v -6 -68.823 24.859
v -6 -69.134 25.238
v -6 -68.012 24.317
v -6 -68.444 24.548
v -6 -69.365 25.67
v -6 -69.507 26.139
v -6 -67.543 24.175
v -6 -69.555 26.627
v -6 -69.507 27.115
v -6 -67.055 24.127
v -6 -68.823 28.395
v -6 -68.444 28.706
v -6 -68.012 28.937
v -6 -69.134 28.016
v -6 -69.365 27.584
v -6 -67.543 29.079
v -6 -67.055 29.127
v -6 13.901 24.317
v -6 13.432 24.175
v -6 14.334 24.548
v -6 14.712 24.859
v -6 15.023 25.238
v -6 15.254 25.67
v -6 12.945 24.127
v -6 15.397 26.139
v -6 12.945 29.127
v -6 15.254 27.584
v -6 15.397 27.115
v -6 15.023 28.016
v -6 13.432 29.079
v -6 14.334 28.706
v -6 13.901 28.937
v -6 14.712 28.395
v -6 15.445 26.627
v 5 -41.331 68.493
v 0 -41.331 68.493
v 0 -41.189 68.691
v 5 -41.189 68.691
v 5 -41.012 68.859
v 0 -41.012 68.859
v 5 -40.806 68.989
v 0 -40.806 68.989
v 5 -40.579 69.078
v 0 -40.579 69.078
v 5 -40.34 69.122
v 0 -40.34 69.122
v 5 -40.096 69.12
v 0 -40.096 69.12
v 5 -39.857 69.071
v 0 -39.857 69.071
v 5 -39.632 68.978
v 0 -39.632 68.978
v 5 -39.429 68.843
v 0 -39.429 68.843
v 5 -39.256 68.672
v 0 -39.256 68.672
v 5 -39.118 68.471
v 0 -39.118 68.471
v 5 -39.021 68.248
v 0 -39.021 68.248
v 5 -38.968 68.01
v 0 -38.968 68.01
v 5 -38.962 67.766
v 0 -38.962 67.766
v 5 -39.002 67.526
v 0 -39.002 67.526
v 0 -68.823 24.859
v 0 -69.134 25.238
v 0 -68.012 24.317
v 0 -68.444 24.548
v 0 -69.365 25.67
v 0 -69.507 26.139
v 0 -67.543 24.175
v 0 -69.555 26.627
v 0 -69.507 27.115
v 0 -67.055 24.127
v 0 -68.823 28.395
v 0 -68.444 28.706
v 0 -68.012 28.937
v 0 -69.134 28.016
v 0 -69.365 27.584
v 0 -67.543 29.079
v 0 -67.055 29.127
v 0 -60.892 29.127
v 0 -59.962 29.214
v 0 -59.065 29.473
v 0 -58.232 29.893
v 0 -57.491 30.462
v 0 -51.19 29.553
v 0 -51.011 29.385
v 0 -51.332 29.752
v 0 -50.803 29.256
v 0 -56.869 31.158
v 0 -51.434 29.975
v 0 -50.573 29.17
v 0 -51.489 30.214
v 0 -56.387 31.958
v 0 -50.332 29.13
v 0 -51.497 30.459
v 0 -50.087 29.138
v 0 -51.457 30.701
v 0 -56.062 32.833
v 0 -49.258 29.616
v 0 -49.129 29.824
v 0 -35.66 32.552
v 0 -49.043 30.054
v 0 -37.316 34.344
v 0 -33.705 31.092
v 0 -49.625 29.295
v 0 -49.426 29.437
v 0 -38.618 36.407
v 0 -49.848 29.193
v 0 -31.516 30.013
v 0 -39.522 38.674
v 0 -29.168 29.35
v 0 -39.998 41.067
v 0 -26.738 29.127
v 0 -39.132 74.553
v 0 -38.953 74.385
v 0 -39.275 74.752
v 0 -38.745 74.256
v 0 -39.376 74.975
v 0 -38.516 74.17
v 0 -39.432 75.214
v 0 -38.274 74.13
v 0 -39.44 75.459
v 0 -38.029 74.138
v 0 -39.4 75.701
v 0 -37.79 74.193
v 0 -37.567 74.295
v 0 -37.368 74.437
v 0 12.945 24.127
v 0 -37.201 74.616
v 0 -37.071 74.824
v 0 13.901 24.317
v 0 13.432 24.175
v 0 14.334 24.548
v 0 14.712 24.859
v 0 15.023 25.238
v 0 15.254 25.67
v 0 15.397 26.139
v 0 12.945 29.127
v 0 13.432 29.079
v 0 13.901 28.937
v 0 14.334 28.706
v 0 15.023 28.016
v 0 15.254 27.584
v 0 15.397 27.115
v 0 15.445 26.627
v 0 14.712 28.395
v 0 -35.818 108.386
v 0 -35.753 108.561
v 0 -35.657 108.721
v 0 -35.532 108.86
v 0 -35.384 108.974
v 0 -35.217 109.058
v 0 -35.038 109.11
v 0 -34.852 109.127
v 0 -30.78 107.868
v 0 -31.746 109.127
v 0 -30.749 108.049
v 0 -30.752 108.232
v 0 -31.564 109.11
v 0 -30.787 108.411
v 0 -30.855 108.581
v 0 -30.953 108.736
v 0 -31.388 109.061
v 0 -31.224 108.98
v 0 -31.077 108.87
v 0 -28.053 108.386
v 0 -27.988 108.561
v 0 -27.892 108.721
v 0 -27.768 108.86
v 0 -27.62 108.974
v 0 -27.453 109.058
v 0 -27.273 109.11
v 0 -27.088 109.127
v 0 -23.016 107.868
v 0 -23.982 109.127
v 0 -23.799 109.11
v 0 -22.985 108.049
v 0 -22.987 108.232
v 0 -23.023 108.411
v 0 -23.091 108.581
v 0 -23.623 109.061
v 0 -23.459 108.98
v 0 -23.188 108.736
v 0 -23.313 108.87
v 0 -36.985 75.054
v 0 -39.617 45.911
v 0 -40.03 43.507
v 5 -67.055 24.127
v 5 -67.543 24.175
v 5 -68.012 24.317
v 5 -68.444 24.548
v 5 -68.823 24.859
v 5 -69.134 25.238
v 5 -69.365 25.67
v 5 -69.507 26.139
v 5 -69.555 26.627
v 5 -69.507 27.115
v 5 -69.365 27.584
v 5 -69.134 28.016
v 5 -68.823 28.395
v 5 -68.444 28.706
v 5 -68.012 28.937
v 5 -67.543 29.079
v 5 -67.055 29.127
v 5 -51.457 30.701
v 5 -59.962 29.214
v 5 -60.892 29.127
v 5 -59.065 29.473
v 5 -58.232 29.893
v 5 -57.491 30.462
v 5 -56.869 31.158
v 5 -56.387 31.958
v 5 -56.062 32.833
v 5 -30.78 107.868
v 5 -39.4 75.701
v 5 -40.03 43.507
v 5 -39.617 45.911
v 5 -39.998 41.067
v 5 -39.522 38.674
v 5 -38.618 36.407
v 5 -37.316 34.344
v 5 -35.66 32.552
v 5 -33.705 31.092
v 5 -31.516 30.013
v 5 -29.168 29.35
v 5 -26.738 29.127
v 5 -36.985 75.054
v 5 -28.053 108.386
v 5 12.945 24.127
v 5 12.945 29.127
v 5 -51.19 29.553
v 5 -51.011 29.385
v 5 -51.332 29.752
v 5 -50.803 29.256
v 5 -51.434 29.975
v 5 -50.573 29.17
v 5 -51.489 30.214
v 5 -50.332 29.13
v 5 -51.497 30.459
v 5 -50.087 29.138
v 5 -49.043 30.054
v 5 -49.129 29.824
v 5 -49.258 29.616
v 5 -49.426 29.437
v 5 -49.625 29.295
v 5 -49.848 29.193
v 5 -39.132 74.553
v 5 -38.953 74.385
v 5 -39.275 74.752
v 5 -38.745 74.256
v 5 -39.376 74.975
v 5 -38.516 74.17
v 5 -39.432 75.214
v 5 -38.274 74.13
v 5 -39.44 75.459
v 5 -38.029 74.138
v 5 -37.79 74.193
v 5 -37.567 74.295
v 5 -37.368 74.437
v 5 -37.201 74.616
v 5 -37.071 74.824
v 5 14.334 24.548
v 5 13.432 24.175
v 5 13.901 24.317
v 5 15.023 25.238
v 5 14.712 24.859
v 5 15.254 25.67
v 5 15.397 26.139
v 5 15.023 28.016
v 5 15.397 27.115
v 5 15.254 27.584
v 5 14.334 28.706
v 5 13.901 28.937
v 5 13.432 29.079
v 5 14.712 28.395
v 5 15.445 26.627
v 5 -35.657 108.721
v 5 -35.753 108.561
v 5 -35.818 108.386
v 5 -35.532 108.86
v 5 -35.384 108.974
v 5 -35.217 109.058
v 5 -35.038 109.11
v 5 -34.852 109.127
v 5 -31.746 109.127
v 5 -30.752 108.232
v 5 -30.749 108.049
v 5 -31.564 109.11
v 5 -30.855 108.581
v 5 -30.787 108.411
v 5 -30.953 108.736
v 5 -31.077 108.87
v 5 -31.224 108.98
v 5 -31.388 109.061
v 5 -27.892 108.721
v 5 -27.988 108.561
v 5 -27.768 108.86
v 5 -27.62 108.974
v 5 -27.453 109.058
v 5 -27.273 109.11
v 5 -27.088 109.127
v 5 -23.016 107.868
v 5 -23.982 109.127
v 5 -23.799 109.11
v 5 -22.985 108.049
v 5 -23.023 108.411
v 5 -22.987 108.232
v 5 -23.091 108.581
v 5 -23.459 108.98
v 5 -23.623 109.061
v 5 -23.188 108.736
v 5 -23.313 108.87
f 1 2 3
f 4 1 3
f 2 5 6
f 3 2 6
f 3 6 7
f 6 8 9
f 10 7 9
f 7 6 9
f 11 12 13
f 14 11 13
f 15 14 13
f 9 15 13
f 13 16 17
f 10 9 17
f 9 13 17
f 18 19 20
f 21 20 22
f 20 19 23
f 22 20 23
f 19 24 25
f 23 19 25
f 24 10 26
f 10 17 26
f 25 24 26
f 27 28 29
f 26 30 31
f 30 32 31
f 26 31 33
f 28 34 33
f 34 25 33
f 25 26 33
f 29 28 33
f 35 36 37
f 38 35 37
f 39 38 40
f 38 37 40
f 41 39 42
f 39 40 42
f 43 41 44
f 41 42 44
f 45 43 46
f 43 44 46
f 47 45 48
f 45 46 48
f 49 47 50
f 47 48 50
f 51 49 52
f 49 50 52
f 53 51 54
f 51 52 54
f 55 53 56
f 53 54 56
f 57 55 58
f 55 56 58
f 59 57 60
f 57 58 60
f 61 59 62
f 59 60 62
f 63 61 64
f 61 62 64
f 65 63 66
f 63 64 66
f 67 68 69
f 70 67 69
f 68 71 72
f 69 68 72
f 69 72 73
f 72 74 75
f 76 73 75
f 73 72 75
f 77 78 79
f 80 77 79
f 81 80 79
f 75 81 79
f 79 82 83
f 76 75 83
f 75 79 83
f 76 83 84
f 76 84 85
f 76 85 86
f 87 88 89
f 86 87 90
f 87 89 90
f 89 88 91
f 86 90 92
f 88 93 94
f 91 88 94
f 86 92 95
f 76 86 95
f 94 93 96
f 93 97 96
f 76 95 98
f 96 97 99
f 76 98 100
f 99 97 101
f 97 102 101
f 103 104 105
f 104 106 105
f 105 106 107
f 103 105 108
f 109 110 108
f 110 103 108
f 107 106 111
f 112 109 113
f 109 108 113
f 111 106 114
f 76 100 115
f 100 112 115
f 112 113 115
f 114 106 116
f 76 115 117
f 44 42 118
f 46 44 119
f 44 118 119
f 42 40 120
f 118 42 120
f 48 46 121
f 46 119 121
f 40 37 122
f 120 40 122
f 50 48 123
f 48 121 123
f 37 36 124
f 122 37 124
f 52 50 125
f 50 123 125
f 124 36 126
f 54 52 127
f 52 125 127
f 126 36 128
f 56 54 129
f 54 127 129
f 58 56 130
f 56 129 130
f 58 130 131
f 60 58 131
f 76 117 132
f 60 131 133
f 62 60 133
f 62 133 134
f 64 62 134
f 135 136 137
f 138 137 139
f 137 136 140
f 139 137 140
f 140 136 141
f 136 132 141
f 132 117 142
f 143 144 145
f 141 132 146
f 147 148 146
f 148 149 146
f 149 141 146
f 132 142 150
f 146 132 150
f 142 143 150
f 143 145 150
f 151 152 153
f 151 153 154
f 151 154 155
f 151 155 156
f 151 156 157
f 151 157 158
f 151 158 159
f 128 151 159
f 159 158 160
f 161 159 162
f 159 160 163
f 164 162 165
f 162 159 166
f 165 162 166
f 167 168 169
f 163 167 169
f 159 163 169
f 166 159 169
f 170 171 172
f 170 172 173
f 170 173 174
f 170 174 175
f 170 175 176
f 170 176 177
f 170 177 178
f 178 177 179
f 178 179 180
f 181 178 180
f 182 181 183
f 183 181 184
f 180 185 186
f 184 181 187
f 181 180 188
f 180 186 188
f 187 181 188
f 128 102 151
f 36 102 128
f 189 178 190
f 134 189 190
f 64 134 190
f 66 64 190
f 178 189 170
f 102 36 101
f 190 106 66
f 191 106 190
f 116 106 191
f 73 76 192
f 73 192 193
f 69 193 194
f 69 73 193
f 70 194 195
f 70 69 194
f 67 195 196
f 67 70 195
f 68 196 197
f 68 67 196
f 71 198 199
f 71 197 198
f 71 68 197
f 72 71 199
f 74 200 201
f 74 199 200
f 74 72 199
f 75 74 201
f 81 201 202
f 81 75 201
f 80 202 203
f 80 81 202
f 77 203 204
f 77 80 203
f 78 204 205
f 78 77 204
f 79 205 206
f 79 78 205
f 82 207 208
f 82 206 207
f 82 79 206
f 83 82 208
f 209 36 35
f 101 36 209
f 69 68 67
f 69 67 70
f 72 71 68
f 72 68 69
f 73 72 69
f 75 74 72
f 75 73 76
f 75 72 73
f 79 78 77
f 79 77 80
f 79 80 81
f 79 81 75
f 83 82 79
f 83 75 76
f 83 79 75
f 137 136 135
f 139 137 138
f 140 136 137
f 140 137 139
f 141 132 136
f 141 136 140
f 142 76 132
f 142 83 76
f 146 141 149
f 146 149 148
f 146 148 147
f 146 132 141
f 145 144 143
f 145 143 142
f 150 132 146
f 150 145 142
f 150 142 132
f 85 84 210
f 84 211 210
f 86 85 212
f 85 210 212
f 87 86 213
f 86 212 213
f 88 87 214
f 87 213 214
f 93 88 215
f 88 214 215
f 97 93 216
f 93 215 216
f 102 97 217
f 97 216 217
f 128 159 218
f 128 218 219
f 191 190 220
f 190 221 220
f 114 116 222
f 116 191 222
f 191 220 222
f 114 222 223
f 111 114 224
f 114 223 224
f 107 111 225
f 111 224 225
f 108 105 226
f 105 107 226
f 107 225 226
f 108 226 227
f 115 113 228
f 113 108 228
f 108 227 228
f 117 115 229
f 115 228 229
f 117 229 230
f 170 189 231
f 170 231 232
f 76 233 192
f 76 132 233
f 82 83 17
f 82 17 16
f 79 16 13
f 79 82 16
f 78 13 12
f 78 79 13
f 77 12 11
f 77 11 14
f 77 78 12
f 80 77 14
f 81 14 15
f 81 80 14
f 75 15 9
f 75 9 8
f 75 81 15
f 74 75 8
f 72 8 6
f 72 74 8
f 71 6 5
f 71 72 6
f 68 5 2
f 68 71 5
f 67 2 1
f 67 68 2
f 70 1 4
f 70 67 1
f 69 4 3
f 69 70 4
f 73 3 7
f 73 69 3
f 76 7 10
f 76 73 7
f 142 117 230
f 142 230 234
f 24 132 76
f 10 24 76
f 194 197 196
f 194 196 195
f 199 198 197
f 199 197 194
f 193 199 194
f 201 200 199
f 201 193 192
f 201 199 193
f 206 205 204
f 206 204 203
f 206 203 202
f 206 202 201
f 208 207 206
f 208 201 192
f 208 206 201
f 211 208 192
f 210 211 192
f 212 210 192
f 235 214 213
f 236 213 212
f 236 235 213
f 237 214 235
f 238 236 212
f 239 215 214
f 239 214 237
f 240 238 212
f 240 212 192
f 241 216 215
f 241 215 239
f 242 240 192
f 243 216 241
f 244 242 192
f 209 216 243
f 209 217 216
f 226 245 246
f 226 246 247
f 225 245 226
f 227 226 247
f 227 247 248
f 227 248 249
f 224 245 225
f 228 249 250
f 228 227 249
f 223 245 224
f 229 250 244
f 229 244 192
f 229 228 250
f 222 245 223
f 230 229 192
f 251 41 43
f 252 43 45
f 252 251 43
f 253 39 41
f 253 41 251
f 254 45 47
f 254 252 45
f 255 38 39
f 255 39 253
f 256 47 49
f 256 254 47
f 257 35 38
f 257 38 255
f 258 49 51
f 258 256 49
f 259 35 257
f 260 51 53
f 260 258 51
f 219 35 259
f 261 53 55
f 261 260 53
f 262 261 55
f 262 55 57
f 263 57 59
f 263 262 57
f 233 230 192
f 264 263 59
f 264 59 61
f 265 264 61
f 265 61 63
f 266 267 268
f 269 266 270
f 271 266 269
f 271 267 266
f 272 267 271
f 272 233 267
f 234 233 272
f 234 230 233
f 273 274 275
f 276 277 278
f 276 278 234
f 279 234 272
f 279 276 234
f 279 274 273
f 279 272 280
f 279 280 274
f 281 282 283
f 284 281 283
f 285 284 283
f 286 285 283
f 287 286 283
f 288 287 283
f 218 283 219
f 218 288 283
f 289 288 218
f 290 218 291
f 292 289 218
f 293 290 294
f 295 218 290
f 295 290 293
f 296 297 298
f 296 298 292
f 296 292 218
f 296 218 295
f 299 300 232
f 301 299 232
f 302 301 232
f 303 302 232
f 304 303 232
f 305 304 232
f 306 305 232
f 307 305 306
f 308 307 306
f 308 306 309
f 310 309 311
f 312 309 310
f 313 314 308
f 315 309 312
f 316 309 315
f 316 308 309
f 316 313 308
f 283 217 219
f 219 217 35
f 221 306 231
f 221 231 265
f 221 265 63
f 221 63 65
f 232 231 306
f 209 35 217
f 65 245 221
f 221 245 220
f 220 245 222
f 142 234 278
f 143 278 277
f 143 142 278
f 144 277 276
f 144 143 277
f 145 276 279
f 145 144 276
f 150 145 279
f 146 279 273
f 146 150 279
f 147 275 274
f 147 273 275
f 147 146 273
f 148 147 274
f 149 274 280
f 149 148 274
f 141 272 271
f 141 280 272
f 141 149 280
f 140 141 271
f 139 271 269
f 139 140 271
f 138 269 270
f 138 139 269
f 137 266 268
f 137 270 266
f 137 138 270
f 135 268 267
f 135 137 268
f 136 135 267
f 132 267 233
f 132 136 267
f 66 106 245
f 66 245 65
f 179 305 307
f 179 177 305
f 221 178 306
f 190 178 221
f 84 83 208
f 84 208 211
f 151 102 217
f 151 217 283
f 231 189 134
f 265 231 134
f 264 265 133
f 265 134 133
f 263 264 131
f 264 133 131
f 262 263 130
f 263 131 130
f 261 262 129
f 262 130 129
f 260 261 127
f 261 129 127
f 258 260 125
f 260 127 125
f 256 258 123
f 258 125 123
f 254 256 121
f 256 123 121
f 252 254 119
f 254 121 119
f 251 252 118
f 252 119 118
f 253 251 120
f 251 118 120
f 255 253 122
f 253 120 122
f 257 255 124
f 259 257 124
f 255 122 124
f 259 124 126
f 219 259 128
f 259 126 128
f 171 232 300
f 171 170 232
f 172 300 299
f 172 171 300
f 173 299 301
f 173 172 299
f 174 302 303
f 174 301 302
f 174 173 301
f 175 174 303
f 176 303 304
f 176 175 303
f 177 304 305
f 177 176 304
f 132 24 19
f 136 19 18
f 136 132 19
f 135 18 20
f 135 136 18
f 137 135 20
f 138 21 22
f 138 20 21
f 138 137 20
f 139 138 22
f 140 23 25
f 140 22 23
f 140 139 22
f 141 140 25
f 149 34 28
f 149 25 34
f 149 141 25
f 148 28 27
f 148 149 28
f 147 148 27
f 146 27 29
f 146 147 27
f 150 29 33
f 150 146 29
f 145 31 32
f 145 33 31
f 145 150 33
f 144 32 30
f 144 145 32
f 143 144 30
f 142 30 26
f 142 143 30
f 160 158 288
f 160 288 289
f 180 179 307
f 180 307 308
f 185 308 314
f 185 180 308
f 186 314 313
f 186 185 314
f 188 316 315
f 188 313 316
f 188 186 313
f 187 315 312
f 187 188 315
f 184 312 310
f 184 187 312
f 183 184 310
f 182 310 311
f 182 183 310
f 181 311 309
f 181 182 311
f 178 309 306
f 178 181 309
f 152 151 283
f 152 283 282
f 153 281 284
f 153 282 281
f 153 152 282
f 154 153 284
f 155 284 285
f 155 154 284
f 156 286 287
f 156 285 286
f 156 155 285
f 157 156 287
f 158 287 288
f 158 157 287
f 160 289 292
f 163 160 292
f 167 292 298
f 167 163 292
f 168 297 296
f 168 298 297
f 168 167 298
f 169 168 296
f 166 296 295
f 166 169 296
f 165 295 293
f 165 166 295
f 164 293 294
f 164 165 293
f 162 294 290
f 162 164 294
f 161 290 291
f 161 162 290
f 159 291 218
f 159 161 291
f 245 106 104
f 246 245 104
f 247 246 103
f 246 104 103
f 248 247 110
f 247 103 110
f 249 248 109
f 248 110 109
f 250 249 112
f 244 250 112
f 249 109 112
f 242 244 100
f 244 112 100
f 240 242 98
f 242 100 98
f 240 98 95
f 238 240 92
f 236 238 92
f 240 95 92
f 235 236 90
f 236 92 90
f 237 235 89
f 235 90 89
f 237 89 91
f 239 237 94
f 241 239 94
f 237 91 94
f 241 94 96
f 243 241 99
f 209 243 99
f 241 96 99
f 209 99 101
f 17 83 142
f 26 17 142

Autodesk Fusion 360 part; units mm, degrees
sketch "Sketch1" plane through (0, 0, 0) normal (1, 0, 0) x (0, 1, 0)
  circle A0 centre (-67.0553, 26.6271) radius 2.5
  line L0 (-67.0553, 29.1271) -> (12.9447, 29.1271)
  line L1 (12.9447, 29.1271) -> (12.9447, 24.1271)
  line L2 (12.9447, 24.1271) -> (-67.0553, 24.1271)
  line L3 (-67.0553, 24.1271) -> (-67.0553, 29.1271)
  circle A1 centre (12.9447, 26.6271) radius 2.5
  line L4 (-57.0553, 29.1271) -> (-57.0553, 44.2726) construction
  line L5 (-57.0553, 29.1271) -> (-35.818, 108.3859)
  line L6 (-34.8521, 109.1271) -> (-31.7462, 109.1271)
  line L7 (-30.7803, 107.8682) -> (-51.8789, 29.1271)
  line L8 (-49.2908, 29.1271) -> (-28.0534, 108.3859)
  line L9 (-23.0157, 107.8682) -> (-44.1144, 29.1271)
  line L10 (-27.0875, 109.1271) -> (-23.9817, 109.1271)
  arc A2 (-34.8521, 109.1271) -> (-35.818, 108.3859) centre (-34.8521, 108.1271) ccw
  arc A3 (-30.7803, 107.8682) -> (-31.7462, 109.1271) centre (-31.7462, 108.1271) ccw
  arc A4 (-27.0875, 109.1271) -> (-28.0534, 108.3859) centre (-27.0875, 108.1271) ccw
  arc A5 (-23.0157, 107.8682) -> (-23.9817, 109.1271) centre (-23.9817, 108.1271) ccw
  line L11 (-37.233, 74.1271) -> (-39.8212, 74.1271)
  line L12 (-41.161, 69.1271) -> (-38.5728, 69.1271)
  circle A6 centre (-40.2305, 67.855) radius 1.272
  circle A7 centre (-38.1922, 75.3771) radius 1.25
  line L13 (-38.1922, 75.3771) -> (-39.4422, 75.3771)
  line L14 (-38.1922, 75.3771) -> (-36.9422, 75.3771)
  line L15 (-40.2305, 67.855) -> (-41.5025, 67.8524)
  line L16 (-40.2305, 67.855) -> (-38.9585, 67.8577)
  circle A8 centre (-50.2499, 30.3771) radius 1.25
  dimension "d6" = 5
  dimension "d7" = 80
  dimension "d8" = 5
  dimension "d9" = 10
  dimension "d10" = 2.5
  dimension "d11" = 5
  dimension "d12" = 5
  dimension "d13" = 75
  dimension "d16" = 1
  dimension "d17" = 1
  dimension "d18" = 1
  dimension "d19" = 1
  dimension "d20" = 80
  dimension "d35" = 5
  dimension "d36" = 35
extrude "Extrude1" add sketch "Sketch1" along normal blind 5 contours A0 L3 | A0 L0 L2 A1 | A0 L3 | L0 L5 L6 L7 A2 A3 A6 | L1 A1 | L1 A1 | L0 L7 A8 | L0 L8 A8 | L0 L8 L9 L10 A4 A5 | L7 A6 | L8 L12 A6 | L7 L12 A6 | L7 L8 L11 L12 | L7 L11 A7 | L8 L11 A7 makes body 1
fillet "FrontFillet" radius 5 1 edges at (2.5, -57.0553, 29.1271) on bodies 1
fillet "RearArmFillet" radius 13.3333 1 edges at (2.5, -44.1144, 29.1271) on bodies 1
extrude "AddBaseThickener" add sketch "Sketch1" against normal blind 6 separate body contours A0 L3 | A0 L0 L2 A1 | A0 L3 | L1 A1 | L1 A1 makes body 2
copy_body "CutPasteBodies2" bodies 1 2 removing the originals makes body 3 makes body 4 in component "Component"
component "Component" placed x (1, 0, 0) y (0, 1, 0) z (0, 0, 1) at (0, 0, 0)
equation "boardthickness = 2.5 mm"
equation "fillet = 1 mm"
equation "basethickness = 5 mm"
equation "baselength = 80 mm"
equation "base_setback = 10 mm"
equation "d6 = basethickness"
equation "d7 = baselength"
equation "d8 = d6"
equation "d9 = base_setback"
equation "d10 = boardthickness"
equation "d11 = basethickness"
equation "d12 = d11"
equation "d13 = board_angle"
equation "board_angle = 75 deg"
equation "d16 = fillet"
equation "d17 = fillet"
equation "d20 = holderheight"
equation "holderheight = 80 mm"
equation "d25 = basethickness"
equation "d27 = holderheight / 6"
equation "d28 = -thickener"
equation "thickener = 6 mm"
equation "d35 = basethickness"
equation "d36 = topBadgeSpace"
equation "topBadgeSpace = 35 mm" comment "The depth of the \"slots\" for the holder"
